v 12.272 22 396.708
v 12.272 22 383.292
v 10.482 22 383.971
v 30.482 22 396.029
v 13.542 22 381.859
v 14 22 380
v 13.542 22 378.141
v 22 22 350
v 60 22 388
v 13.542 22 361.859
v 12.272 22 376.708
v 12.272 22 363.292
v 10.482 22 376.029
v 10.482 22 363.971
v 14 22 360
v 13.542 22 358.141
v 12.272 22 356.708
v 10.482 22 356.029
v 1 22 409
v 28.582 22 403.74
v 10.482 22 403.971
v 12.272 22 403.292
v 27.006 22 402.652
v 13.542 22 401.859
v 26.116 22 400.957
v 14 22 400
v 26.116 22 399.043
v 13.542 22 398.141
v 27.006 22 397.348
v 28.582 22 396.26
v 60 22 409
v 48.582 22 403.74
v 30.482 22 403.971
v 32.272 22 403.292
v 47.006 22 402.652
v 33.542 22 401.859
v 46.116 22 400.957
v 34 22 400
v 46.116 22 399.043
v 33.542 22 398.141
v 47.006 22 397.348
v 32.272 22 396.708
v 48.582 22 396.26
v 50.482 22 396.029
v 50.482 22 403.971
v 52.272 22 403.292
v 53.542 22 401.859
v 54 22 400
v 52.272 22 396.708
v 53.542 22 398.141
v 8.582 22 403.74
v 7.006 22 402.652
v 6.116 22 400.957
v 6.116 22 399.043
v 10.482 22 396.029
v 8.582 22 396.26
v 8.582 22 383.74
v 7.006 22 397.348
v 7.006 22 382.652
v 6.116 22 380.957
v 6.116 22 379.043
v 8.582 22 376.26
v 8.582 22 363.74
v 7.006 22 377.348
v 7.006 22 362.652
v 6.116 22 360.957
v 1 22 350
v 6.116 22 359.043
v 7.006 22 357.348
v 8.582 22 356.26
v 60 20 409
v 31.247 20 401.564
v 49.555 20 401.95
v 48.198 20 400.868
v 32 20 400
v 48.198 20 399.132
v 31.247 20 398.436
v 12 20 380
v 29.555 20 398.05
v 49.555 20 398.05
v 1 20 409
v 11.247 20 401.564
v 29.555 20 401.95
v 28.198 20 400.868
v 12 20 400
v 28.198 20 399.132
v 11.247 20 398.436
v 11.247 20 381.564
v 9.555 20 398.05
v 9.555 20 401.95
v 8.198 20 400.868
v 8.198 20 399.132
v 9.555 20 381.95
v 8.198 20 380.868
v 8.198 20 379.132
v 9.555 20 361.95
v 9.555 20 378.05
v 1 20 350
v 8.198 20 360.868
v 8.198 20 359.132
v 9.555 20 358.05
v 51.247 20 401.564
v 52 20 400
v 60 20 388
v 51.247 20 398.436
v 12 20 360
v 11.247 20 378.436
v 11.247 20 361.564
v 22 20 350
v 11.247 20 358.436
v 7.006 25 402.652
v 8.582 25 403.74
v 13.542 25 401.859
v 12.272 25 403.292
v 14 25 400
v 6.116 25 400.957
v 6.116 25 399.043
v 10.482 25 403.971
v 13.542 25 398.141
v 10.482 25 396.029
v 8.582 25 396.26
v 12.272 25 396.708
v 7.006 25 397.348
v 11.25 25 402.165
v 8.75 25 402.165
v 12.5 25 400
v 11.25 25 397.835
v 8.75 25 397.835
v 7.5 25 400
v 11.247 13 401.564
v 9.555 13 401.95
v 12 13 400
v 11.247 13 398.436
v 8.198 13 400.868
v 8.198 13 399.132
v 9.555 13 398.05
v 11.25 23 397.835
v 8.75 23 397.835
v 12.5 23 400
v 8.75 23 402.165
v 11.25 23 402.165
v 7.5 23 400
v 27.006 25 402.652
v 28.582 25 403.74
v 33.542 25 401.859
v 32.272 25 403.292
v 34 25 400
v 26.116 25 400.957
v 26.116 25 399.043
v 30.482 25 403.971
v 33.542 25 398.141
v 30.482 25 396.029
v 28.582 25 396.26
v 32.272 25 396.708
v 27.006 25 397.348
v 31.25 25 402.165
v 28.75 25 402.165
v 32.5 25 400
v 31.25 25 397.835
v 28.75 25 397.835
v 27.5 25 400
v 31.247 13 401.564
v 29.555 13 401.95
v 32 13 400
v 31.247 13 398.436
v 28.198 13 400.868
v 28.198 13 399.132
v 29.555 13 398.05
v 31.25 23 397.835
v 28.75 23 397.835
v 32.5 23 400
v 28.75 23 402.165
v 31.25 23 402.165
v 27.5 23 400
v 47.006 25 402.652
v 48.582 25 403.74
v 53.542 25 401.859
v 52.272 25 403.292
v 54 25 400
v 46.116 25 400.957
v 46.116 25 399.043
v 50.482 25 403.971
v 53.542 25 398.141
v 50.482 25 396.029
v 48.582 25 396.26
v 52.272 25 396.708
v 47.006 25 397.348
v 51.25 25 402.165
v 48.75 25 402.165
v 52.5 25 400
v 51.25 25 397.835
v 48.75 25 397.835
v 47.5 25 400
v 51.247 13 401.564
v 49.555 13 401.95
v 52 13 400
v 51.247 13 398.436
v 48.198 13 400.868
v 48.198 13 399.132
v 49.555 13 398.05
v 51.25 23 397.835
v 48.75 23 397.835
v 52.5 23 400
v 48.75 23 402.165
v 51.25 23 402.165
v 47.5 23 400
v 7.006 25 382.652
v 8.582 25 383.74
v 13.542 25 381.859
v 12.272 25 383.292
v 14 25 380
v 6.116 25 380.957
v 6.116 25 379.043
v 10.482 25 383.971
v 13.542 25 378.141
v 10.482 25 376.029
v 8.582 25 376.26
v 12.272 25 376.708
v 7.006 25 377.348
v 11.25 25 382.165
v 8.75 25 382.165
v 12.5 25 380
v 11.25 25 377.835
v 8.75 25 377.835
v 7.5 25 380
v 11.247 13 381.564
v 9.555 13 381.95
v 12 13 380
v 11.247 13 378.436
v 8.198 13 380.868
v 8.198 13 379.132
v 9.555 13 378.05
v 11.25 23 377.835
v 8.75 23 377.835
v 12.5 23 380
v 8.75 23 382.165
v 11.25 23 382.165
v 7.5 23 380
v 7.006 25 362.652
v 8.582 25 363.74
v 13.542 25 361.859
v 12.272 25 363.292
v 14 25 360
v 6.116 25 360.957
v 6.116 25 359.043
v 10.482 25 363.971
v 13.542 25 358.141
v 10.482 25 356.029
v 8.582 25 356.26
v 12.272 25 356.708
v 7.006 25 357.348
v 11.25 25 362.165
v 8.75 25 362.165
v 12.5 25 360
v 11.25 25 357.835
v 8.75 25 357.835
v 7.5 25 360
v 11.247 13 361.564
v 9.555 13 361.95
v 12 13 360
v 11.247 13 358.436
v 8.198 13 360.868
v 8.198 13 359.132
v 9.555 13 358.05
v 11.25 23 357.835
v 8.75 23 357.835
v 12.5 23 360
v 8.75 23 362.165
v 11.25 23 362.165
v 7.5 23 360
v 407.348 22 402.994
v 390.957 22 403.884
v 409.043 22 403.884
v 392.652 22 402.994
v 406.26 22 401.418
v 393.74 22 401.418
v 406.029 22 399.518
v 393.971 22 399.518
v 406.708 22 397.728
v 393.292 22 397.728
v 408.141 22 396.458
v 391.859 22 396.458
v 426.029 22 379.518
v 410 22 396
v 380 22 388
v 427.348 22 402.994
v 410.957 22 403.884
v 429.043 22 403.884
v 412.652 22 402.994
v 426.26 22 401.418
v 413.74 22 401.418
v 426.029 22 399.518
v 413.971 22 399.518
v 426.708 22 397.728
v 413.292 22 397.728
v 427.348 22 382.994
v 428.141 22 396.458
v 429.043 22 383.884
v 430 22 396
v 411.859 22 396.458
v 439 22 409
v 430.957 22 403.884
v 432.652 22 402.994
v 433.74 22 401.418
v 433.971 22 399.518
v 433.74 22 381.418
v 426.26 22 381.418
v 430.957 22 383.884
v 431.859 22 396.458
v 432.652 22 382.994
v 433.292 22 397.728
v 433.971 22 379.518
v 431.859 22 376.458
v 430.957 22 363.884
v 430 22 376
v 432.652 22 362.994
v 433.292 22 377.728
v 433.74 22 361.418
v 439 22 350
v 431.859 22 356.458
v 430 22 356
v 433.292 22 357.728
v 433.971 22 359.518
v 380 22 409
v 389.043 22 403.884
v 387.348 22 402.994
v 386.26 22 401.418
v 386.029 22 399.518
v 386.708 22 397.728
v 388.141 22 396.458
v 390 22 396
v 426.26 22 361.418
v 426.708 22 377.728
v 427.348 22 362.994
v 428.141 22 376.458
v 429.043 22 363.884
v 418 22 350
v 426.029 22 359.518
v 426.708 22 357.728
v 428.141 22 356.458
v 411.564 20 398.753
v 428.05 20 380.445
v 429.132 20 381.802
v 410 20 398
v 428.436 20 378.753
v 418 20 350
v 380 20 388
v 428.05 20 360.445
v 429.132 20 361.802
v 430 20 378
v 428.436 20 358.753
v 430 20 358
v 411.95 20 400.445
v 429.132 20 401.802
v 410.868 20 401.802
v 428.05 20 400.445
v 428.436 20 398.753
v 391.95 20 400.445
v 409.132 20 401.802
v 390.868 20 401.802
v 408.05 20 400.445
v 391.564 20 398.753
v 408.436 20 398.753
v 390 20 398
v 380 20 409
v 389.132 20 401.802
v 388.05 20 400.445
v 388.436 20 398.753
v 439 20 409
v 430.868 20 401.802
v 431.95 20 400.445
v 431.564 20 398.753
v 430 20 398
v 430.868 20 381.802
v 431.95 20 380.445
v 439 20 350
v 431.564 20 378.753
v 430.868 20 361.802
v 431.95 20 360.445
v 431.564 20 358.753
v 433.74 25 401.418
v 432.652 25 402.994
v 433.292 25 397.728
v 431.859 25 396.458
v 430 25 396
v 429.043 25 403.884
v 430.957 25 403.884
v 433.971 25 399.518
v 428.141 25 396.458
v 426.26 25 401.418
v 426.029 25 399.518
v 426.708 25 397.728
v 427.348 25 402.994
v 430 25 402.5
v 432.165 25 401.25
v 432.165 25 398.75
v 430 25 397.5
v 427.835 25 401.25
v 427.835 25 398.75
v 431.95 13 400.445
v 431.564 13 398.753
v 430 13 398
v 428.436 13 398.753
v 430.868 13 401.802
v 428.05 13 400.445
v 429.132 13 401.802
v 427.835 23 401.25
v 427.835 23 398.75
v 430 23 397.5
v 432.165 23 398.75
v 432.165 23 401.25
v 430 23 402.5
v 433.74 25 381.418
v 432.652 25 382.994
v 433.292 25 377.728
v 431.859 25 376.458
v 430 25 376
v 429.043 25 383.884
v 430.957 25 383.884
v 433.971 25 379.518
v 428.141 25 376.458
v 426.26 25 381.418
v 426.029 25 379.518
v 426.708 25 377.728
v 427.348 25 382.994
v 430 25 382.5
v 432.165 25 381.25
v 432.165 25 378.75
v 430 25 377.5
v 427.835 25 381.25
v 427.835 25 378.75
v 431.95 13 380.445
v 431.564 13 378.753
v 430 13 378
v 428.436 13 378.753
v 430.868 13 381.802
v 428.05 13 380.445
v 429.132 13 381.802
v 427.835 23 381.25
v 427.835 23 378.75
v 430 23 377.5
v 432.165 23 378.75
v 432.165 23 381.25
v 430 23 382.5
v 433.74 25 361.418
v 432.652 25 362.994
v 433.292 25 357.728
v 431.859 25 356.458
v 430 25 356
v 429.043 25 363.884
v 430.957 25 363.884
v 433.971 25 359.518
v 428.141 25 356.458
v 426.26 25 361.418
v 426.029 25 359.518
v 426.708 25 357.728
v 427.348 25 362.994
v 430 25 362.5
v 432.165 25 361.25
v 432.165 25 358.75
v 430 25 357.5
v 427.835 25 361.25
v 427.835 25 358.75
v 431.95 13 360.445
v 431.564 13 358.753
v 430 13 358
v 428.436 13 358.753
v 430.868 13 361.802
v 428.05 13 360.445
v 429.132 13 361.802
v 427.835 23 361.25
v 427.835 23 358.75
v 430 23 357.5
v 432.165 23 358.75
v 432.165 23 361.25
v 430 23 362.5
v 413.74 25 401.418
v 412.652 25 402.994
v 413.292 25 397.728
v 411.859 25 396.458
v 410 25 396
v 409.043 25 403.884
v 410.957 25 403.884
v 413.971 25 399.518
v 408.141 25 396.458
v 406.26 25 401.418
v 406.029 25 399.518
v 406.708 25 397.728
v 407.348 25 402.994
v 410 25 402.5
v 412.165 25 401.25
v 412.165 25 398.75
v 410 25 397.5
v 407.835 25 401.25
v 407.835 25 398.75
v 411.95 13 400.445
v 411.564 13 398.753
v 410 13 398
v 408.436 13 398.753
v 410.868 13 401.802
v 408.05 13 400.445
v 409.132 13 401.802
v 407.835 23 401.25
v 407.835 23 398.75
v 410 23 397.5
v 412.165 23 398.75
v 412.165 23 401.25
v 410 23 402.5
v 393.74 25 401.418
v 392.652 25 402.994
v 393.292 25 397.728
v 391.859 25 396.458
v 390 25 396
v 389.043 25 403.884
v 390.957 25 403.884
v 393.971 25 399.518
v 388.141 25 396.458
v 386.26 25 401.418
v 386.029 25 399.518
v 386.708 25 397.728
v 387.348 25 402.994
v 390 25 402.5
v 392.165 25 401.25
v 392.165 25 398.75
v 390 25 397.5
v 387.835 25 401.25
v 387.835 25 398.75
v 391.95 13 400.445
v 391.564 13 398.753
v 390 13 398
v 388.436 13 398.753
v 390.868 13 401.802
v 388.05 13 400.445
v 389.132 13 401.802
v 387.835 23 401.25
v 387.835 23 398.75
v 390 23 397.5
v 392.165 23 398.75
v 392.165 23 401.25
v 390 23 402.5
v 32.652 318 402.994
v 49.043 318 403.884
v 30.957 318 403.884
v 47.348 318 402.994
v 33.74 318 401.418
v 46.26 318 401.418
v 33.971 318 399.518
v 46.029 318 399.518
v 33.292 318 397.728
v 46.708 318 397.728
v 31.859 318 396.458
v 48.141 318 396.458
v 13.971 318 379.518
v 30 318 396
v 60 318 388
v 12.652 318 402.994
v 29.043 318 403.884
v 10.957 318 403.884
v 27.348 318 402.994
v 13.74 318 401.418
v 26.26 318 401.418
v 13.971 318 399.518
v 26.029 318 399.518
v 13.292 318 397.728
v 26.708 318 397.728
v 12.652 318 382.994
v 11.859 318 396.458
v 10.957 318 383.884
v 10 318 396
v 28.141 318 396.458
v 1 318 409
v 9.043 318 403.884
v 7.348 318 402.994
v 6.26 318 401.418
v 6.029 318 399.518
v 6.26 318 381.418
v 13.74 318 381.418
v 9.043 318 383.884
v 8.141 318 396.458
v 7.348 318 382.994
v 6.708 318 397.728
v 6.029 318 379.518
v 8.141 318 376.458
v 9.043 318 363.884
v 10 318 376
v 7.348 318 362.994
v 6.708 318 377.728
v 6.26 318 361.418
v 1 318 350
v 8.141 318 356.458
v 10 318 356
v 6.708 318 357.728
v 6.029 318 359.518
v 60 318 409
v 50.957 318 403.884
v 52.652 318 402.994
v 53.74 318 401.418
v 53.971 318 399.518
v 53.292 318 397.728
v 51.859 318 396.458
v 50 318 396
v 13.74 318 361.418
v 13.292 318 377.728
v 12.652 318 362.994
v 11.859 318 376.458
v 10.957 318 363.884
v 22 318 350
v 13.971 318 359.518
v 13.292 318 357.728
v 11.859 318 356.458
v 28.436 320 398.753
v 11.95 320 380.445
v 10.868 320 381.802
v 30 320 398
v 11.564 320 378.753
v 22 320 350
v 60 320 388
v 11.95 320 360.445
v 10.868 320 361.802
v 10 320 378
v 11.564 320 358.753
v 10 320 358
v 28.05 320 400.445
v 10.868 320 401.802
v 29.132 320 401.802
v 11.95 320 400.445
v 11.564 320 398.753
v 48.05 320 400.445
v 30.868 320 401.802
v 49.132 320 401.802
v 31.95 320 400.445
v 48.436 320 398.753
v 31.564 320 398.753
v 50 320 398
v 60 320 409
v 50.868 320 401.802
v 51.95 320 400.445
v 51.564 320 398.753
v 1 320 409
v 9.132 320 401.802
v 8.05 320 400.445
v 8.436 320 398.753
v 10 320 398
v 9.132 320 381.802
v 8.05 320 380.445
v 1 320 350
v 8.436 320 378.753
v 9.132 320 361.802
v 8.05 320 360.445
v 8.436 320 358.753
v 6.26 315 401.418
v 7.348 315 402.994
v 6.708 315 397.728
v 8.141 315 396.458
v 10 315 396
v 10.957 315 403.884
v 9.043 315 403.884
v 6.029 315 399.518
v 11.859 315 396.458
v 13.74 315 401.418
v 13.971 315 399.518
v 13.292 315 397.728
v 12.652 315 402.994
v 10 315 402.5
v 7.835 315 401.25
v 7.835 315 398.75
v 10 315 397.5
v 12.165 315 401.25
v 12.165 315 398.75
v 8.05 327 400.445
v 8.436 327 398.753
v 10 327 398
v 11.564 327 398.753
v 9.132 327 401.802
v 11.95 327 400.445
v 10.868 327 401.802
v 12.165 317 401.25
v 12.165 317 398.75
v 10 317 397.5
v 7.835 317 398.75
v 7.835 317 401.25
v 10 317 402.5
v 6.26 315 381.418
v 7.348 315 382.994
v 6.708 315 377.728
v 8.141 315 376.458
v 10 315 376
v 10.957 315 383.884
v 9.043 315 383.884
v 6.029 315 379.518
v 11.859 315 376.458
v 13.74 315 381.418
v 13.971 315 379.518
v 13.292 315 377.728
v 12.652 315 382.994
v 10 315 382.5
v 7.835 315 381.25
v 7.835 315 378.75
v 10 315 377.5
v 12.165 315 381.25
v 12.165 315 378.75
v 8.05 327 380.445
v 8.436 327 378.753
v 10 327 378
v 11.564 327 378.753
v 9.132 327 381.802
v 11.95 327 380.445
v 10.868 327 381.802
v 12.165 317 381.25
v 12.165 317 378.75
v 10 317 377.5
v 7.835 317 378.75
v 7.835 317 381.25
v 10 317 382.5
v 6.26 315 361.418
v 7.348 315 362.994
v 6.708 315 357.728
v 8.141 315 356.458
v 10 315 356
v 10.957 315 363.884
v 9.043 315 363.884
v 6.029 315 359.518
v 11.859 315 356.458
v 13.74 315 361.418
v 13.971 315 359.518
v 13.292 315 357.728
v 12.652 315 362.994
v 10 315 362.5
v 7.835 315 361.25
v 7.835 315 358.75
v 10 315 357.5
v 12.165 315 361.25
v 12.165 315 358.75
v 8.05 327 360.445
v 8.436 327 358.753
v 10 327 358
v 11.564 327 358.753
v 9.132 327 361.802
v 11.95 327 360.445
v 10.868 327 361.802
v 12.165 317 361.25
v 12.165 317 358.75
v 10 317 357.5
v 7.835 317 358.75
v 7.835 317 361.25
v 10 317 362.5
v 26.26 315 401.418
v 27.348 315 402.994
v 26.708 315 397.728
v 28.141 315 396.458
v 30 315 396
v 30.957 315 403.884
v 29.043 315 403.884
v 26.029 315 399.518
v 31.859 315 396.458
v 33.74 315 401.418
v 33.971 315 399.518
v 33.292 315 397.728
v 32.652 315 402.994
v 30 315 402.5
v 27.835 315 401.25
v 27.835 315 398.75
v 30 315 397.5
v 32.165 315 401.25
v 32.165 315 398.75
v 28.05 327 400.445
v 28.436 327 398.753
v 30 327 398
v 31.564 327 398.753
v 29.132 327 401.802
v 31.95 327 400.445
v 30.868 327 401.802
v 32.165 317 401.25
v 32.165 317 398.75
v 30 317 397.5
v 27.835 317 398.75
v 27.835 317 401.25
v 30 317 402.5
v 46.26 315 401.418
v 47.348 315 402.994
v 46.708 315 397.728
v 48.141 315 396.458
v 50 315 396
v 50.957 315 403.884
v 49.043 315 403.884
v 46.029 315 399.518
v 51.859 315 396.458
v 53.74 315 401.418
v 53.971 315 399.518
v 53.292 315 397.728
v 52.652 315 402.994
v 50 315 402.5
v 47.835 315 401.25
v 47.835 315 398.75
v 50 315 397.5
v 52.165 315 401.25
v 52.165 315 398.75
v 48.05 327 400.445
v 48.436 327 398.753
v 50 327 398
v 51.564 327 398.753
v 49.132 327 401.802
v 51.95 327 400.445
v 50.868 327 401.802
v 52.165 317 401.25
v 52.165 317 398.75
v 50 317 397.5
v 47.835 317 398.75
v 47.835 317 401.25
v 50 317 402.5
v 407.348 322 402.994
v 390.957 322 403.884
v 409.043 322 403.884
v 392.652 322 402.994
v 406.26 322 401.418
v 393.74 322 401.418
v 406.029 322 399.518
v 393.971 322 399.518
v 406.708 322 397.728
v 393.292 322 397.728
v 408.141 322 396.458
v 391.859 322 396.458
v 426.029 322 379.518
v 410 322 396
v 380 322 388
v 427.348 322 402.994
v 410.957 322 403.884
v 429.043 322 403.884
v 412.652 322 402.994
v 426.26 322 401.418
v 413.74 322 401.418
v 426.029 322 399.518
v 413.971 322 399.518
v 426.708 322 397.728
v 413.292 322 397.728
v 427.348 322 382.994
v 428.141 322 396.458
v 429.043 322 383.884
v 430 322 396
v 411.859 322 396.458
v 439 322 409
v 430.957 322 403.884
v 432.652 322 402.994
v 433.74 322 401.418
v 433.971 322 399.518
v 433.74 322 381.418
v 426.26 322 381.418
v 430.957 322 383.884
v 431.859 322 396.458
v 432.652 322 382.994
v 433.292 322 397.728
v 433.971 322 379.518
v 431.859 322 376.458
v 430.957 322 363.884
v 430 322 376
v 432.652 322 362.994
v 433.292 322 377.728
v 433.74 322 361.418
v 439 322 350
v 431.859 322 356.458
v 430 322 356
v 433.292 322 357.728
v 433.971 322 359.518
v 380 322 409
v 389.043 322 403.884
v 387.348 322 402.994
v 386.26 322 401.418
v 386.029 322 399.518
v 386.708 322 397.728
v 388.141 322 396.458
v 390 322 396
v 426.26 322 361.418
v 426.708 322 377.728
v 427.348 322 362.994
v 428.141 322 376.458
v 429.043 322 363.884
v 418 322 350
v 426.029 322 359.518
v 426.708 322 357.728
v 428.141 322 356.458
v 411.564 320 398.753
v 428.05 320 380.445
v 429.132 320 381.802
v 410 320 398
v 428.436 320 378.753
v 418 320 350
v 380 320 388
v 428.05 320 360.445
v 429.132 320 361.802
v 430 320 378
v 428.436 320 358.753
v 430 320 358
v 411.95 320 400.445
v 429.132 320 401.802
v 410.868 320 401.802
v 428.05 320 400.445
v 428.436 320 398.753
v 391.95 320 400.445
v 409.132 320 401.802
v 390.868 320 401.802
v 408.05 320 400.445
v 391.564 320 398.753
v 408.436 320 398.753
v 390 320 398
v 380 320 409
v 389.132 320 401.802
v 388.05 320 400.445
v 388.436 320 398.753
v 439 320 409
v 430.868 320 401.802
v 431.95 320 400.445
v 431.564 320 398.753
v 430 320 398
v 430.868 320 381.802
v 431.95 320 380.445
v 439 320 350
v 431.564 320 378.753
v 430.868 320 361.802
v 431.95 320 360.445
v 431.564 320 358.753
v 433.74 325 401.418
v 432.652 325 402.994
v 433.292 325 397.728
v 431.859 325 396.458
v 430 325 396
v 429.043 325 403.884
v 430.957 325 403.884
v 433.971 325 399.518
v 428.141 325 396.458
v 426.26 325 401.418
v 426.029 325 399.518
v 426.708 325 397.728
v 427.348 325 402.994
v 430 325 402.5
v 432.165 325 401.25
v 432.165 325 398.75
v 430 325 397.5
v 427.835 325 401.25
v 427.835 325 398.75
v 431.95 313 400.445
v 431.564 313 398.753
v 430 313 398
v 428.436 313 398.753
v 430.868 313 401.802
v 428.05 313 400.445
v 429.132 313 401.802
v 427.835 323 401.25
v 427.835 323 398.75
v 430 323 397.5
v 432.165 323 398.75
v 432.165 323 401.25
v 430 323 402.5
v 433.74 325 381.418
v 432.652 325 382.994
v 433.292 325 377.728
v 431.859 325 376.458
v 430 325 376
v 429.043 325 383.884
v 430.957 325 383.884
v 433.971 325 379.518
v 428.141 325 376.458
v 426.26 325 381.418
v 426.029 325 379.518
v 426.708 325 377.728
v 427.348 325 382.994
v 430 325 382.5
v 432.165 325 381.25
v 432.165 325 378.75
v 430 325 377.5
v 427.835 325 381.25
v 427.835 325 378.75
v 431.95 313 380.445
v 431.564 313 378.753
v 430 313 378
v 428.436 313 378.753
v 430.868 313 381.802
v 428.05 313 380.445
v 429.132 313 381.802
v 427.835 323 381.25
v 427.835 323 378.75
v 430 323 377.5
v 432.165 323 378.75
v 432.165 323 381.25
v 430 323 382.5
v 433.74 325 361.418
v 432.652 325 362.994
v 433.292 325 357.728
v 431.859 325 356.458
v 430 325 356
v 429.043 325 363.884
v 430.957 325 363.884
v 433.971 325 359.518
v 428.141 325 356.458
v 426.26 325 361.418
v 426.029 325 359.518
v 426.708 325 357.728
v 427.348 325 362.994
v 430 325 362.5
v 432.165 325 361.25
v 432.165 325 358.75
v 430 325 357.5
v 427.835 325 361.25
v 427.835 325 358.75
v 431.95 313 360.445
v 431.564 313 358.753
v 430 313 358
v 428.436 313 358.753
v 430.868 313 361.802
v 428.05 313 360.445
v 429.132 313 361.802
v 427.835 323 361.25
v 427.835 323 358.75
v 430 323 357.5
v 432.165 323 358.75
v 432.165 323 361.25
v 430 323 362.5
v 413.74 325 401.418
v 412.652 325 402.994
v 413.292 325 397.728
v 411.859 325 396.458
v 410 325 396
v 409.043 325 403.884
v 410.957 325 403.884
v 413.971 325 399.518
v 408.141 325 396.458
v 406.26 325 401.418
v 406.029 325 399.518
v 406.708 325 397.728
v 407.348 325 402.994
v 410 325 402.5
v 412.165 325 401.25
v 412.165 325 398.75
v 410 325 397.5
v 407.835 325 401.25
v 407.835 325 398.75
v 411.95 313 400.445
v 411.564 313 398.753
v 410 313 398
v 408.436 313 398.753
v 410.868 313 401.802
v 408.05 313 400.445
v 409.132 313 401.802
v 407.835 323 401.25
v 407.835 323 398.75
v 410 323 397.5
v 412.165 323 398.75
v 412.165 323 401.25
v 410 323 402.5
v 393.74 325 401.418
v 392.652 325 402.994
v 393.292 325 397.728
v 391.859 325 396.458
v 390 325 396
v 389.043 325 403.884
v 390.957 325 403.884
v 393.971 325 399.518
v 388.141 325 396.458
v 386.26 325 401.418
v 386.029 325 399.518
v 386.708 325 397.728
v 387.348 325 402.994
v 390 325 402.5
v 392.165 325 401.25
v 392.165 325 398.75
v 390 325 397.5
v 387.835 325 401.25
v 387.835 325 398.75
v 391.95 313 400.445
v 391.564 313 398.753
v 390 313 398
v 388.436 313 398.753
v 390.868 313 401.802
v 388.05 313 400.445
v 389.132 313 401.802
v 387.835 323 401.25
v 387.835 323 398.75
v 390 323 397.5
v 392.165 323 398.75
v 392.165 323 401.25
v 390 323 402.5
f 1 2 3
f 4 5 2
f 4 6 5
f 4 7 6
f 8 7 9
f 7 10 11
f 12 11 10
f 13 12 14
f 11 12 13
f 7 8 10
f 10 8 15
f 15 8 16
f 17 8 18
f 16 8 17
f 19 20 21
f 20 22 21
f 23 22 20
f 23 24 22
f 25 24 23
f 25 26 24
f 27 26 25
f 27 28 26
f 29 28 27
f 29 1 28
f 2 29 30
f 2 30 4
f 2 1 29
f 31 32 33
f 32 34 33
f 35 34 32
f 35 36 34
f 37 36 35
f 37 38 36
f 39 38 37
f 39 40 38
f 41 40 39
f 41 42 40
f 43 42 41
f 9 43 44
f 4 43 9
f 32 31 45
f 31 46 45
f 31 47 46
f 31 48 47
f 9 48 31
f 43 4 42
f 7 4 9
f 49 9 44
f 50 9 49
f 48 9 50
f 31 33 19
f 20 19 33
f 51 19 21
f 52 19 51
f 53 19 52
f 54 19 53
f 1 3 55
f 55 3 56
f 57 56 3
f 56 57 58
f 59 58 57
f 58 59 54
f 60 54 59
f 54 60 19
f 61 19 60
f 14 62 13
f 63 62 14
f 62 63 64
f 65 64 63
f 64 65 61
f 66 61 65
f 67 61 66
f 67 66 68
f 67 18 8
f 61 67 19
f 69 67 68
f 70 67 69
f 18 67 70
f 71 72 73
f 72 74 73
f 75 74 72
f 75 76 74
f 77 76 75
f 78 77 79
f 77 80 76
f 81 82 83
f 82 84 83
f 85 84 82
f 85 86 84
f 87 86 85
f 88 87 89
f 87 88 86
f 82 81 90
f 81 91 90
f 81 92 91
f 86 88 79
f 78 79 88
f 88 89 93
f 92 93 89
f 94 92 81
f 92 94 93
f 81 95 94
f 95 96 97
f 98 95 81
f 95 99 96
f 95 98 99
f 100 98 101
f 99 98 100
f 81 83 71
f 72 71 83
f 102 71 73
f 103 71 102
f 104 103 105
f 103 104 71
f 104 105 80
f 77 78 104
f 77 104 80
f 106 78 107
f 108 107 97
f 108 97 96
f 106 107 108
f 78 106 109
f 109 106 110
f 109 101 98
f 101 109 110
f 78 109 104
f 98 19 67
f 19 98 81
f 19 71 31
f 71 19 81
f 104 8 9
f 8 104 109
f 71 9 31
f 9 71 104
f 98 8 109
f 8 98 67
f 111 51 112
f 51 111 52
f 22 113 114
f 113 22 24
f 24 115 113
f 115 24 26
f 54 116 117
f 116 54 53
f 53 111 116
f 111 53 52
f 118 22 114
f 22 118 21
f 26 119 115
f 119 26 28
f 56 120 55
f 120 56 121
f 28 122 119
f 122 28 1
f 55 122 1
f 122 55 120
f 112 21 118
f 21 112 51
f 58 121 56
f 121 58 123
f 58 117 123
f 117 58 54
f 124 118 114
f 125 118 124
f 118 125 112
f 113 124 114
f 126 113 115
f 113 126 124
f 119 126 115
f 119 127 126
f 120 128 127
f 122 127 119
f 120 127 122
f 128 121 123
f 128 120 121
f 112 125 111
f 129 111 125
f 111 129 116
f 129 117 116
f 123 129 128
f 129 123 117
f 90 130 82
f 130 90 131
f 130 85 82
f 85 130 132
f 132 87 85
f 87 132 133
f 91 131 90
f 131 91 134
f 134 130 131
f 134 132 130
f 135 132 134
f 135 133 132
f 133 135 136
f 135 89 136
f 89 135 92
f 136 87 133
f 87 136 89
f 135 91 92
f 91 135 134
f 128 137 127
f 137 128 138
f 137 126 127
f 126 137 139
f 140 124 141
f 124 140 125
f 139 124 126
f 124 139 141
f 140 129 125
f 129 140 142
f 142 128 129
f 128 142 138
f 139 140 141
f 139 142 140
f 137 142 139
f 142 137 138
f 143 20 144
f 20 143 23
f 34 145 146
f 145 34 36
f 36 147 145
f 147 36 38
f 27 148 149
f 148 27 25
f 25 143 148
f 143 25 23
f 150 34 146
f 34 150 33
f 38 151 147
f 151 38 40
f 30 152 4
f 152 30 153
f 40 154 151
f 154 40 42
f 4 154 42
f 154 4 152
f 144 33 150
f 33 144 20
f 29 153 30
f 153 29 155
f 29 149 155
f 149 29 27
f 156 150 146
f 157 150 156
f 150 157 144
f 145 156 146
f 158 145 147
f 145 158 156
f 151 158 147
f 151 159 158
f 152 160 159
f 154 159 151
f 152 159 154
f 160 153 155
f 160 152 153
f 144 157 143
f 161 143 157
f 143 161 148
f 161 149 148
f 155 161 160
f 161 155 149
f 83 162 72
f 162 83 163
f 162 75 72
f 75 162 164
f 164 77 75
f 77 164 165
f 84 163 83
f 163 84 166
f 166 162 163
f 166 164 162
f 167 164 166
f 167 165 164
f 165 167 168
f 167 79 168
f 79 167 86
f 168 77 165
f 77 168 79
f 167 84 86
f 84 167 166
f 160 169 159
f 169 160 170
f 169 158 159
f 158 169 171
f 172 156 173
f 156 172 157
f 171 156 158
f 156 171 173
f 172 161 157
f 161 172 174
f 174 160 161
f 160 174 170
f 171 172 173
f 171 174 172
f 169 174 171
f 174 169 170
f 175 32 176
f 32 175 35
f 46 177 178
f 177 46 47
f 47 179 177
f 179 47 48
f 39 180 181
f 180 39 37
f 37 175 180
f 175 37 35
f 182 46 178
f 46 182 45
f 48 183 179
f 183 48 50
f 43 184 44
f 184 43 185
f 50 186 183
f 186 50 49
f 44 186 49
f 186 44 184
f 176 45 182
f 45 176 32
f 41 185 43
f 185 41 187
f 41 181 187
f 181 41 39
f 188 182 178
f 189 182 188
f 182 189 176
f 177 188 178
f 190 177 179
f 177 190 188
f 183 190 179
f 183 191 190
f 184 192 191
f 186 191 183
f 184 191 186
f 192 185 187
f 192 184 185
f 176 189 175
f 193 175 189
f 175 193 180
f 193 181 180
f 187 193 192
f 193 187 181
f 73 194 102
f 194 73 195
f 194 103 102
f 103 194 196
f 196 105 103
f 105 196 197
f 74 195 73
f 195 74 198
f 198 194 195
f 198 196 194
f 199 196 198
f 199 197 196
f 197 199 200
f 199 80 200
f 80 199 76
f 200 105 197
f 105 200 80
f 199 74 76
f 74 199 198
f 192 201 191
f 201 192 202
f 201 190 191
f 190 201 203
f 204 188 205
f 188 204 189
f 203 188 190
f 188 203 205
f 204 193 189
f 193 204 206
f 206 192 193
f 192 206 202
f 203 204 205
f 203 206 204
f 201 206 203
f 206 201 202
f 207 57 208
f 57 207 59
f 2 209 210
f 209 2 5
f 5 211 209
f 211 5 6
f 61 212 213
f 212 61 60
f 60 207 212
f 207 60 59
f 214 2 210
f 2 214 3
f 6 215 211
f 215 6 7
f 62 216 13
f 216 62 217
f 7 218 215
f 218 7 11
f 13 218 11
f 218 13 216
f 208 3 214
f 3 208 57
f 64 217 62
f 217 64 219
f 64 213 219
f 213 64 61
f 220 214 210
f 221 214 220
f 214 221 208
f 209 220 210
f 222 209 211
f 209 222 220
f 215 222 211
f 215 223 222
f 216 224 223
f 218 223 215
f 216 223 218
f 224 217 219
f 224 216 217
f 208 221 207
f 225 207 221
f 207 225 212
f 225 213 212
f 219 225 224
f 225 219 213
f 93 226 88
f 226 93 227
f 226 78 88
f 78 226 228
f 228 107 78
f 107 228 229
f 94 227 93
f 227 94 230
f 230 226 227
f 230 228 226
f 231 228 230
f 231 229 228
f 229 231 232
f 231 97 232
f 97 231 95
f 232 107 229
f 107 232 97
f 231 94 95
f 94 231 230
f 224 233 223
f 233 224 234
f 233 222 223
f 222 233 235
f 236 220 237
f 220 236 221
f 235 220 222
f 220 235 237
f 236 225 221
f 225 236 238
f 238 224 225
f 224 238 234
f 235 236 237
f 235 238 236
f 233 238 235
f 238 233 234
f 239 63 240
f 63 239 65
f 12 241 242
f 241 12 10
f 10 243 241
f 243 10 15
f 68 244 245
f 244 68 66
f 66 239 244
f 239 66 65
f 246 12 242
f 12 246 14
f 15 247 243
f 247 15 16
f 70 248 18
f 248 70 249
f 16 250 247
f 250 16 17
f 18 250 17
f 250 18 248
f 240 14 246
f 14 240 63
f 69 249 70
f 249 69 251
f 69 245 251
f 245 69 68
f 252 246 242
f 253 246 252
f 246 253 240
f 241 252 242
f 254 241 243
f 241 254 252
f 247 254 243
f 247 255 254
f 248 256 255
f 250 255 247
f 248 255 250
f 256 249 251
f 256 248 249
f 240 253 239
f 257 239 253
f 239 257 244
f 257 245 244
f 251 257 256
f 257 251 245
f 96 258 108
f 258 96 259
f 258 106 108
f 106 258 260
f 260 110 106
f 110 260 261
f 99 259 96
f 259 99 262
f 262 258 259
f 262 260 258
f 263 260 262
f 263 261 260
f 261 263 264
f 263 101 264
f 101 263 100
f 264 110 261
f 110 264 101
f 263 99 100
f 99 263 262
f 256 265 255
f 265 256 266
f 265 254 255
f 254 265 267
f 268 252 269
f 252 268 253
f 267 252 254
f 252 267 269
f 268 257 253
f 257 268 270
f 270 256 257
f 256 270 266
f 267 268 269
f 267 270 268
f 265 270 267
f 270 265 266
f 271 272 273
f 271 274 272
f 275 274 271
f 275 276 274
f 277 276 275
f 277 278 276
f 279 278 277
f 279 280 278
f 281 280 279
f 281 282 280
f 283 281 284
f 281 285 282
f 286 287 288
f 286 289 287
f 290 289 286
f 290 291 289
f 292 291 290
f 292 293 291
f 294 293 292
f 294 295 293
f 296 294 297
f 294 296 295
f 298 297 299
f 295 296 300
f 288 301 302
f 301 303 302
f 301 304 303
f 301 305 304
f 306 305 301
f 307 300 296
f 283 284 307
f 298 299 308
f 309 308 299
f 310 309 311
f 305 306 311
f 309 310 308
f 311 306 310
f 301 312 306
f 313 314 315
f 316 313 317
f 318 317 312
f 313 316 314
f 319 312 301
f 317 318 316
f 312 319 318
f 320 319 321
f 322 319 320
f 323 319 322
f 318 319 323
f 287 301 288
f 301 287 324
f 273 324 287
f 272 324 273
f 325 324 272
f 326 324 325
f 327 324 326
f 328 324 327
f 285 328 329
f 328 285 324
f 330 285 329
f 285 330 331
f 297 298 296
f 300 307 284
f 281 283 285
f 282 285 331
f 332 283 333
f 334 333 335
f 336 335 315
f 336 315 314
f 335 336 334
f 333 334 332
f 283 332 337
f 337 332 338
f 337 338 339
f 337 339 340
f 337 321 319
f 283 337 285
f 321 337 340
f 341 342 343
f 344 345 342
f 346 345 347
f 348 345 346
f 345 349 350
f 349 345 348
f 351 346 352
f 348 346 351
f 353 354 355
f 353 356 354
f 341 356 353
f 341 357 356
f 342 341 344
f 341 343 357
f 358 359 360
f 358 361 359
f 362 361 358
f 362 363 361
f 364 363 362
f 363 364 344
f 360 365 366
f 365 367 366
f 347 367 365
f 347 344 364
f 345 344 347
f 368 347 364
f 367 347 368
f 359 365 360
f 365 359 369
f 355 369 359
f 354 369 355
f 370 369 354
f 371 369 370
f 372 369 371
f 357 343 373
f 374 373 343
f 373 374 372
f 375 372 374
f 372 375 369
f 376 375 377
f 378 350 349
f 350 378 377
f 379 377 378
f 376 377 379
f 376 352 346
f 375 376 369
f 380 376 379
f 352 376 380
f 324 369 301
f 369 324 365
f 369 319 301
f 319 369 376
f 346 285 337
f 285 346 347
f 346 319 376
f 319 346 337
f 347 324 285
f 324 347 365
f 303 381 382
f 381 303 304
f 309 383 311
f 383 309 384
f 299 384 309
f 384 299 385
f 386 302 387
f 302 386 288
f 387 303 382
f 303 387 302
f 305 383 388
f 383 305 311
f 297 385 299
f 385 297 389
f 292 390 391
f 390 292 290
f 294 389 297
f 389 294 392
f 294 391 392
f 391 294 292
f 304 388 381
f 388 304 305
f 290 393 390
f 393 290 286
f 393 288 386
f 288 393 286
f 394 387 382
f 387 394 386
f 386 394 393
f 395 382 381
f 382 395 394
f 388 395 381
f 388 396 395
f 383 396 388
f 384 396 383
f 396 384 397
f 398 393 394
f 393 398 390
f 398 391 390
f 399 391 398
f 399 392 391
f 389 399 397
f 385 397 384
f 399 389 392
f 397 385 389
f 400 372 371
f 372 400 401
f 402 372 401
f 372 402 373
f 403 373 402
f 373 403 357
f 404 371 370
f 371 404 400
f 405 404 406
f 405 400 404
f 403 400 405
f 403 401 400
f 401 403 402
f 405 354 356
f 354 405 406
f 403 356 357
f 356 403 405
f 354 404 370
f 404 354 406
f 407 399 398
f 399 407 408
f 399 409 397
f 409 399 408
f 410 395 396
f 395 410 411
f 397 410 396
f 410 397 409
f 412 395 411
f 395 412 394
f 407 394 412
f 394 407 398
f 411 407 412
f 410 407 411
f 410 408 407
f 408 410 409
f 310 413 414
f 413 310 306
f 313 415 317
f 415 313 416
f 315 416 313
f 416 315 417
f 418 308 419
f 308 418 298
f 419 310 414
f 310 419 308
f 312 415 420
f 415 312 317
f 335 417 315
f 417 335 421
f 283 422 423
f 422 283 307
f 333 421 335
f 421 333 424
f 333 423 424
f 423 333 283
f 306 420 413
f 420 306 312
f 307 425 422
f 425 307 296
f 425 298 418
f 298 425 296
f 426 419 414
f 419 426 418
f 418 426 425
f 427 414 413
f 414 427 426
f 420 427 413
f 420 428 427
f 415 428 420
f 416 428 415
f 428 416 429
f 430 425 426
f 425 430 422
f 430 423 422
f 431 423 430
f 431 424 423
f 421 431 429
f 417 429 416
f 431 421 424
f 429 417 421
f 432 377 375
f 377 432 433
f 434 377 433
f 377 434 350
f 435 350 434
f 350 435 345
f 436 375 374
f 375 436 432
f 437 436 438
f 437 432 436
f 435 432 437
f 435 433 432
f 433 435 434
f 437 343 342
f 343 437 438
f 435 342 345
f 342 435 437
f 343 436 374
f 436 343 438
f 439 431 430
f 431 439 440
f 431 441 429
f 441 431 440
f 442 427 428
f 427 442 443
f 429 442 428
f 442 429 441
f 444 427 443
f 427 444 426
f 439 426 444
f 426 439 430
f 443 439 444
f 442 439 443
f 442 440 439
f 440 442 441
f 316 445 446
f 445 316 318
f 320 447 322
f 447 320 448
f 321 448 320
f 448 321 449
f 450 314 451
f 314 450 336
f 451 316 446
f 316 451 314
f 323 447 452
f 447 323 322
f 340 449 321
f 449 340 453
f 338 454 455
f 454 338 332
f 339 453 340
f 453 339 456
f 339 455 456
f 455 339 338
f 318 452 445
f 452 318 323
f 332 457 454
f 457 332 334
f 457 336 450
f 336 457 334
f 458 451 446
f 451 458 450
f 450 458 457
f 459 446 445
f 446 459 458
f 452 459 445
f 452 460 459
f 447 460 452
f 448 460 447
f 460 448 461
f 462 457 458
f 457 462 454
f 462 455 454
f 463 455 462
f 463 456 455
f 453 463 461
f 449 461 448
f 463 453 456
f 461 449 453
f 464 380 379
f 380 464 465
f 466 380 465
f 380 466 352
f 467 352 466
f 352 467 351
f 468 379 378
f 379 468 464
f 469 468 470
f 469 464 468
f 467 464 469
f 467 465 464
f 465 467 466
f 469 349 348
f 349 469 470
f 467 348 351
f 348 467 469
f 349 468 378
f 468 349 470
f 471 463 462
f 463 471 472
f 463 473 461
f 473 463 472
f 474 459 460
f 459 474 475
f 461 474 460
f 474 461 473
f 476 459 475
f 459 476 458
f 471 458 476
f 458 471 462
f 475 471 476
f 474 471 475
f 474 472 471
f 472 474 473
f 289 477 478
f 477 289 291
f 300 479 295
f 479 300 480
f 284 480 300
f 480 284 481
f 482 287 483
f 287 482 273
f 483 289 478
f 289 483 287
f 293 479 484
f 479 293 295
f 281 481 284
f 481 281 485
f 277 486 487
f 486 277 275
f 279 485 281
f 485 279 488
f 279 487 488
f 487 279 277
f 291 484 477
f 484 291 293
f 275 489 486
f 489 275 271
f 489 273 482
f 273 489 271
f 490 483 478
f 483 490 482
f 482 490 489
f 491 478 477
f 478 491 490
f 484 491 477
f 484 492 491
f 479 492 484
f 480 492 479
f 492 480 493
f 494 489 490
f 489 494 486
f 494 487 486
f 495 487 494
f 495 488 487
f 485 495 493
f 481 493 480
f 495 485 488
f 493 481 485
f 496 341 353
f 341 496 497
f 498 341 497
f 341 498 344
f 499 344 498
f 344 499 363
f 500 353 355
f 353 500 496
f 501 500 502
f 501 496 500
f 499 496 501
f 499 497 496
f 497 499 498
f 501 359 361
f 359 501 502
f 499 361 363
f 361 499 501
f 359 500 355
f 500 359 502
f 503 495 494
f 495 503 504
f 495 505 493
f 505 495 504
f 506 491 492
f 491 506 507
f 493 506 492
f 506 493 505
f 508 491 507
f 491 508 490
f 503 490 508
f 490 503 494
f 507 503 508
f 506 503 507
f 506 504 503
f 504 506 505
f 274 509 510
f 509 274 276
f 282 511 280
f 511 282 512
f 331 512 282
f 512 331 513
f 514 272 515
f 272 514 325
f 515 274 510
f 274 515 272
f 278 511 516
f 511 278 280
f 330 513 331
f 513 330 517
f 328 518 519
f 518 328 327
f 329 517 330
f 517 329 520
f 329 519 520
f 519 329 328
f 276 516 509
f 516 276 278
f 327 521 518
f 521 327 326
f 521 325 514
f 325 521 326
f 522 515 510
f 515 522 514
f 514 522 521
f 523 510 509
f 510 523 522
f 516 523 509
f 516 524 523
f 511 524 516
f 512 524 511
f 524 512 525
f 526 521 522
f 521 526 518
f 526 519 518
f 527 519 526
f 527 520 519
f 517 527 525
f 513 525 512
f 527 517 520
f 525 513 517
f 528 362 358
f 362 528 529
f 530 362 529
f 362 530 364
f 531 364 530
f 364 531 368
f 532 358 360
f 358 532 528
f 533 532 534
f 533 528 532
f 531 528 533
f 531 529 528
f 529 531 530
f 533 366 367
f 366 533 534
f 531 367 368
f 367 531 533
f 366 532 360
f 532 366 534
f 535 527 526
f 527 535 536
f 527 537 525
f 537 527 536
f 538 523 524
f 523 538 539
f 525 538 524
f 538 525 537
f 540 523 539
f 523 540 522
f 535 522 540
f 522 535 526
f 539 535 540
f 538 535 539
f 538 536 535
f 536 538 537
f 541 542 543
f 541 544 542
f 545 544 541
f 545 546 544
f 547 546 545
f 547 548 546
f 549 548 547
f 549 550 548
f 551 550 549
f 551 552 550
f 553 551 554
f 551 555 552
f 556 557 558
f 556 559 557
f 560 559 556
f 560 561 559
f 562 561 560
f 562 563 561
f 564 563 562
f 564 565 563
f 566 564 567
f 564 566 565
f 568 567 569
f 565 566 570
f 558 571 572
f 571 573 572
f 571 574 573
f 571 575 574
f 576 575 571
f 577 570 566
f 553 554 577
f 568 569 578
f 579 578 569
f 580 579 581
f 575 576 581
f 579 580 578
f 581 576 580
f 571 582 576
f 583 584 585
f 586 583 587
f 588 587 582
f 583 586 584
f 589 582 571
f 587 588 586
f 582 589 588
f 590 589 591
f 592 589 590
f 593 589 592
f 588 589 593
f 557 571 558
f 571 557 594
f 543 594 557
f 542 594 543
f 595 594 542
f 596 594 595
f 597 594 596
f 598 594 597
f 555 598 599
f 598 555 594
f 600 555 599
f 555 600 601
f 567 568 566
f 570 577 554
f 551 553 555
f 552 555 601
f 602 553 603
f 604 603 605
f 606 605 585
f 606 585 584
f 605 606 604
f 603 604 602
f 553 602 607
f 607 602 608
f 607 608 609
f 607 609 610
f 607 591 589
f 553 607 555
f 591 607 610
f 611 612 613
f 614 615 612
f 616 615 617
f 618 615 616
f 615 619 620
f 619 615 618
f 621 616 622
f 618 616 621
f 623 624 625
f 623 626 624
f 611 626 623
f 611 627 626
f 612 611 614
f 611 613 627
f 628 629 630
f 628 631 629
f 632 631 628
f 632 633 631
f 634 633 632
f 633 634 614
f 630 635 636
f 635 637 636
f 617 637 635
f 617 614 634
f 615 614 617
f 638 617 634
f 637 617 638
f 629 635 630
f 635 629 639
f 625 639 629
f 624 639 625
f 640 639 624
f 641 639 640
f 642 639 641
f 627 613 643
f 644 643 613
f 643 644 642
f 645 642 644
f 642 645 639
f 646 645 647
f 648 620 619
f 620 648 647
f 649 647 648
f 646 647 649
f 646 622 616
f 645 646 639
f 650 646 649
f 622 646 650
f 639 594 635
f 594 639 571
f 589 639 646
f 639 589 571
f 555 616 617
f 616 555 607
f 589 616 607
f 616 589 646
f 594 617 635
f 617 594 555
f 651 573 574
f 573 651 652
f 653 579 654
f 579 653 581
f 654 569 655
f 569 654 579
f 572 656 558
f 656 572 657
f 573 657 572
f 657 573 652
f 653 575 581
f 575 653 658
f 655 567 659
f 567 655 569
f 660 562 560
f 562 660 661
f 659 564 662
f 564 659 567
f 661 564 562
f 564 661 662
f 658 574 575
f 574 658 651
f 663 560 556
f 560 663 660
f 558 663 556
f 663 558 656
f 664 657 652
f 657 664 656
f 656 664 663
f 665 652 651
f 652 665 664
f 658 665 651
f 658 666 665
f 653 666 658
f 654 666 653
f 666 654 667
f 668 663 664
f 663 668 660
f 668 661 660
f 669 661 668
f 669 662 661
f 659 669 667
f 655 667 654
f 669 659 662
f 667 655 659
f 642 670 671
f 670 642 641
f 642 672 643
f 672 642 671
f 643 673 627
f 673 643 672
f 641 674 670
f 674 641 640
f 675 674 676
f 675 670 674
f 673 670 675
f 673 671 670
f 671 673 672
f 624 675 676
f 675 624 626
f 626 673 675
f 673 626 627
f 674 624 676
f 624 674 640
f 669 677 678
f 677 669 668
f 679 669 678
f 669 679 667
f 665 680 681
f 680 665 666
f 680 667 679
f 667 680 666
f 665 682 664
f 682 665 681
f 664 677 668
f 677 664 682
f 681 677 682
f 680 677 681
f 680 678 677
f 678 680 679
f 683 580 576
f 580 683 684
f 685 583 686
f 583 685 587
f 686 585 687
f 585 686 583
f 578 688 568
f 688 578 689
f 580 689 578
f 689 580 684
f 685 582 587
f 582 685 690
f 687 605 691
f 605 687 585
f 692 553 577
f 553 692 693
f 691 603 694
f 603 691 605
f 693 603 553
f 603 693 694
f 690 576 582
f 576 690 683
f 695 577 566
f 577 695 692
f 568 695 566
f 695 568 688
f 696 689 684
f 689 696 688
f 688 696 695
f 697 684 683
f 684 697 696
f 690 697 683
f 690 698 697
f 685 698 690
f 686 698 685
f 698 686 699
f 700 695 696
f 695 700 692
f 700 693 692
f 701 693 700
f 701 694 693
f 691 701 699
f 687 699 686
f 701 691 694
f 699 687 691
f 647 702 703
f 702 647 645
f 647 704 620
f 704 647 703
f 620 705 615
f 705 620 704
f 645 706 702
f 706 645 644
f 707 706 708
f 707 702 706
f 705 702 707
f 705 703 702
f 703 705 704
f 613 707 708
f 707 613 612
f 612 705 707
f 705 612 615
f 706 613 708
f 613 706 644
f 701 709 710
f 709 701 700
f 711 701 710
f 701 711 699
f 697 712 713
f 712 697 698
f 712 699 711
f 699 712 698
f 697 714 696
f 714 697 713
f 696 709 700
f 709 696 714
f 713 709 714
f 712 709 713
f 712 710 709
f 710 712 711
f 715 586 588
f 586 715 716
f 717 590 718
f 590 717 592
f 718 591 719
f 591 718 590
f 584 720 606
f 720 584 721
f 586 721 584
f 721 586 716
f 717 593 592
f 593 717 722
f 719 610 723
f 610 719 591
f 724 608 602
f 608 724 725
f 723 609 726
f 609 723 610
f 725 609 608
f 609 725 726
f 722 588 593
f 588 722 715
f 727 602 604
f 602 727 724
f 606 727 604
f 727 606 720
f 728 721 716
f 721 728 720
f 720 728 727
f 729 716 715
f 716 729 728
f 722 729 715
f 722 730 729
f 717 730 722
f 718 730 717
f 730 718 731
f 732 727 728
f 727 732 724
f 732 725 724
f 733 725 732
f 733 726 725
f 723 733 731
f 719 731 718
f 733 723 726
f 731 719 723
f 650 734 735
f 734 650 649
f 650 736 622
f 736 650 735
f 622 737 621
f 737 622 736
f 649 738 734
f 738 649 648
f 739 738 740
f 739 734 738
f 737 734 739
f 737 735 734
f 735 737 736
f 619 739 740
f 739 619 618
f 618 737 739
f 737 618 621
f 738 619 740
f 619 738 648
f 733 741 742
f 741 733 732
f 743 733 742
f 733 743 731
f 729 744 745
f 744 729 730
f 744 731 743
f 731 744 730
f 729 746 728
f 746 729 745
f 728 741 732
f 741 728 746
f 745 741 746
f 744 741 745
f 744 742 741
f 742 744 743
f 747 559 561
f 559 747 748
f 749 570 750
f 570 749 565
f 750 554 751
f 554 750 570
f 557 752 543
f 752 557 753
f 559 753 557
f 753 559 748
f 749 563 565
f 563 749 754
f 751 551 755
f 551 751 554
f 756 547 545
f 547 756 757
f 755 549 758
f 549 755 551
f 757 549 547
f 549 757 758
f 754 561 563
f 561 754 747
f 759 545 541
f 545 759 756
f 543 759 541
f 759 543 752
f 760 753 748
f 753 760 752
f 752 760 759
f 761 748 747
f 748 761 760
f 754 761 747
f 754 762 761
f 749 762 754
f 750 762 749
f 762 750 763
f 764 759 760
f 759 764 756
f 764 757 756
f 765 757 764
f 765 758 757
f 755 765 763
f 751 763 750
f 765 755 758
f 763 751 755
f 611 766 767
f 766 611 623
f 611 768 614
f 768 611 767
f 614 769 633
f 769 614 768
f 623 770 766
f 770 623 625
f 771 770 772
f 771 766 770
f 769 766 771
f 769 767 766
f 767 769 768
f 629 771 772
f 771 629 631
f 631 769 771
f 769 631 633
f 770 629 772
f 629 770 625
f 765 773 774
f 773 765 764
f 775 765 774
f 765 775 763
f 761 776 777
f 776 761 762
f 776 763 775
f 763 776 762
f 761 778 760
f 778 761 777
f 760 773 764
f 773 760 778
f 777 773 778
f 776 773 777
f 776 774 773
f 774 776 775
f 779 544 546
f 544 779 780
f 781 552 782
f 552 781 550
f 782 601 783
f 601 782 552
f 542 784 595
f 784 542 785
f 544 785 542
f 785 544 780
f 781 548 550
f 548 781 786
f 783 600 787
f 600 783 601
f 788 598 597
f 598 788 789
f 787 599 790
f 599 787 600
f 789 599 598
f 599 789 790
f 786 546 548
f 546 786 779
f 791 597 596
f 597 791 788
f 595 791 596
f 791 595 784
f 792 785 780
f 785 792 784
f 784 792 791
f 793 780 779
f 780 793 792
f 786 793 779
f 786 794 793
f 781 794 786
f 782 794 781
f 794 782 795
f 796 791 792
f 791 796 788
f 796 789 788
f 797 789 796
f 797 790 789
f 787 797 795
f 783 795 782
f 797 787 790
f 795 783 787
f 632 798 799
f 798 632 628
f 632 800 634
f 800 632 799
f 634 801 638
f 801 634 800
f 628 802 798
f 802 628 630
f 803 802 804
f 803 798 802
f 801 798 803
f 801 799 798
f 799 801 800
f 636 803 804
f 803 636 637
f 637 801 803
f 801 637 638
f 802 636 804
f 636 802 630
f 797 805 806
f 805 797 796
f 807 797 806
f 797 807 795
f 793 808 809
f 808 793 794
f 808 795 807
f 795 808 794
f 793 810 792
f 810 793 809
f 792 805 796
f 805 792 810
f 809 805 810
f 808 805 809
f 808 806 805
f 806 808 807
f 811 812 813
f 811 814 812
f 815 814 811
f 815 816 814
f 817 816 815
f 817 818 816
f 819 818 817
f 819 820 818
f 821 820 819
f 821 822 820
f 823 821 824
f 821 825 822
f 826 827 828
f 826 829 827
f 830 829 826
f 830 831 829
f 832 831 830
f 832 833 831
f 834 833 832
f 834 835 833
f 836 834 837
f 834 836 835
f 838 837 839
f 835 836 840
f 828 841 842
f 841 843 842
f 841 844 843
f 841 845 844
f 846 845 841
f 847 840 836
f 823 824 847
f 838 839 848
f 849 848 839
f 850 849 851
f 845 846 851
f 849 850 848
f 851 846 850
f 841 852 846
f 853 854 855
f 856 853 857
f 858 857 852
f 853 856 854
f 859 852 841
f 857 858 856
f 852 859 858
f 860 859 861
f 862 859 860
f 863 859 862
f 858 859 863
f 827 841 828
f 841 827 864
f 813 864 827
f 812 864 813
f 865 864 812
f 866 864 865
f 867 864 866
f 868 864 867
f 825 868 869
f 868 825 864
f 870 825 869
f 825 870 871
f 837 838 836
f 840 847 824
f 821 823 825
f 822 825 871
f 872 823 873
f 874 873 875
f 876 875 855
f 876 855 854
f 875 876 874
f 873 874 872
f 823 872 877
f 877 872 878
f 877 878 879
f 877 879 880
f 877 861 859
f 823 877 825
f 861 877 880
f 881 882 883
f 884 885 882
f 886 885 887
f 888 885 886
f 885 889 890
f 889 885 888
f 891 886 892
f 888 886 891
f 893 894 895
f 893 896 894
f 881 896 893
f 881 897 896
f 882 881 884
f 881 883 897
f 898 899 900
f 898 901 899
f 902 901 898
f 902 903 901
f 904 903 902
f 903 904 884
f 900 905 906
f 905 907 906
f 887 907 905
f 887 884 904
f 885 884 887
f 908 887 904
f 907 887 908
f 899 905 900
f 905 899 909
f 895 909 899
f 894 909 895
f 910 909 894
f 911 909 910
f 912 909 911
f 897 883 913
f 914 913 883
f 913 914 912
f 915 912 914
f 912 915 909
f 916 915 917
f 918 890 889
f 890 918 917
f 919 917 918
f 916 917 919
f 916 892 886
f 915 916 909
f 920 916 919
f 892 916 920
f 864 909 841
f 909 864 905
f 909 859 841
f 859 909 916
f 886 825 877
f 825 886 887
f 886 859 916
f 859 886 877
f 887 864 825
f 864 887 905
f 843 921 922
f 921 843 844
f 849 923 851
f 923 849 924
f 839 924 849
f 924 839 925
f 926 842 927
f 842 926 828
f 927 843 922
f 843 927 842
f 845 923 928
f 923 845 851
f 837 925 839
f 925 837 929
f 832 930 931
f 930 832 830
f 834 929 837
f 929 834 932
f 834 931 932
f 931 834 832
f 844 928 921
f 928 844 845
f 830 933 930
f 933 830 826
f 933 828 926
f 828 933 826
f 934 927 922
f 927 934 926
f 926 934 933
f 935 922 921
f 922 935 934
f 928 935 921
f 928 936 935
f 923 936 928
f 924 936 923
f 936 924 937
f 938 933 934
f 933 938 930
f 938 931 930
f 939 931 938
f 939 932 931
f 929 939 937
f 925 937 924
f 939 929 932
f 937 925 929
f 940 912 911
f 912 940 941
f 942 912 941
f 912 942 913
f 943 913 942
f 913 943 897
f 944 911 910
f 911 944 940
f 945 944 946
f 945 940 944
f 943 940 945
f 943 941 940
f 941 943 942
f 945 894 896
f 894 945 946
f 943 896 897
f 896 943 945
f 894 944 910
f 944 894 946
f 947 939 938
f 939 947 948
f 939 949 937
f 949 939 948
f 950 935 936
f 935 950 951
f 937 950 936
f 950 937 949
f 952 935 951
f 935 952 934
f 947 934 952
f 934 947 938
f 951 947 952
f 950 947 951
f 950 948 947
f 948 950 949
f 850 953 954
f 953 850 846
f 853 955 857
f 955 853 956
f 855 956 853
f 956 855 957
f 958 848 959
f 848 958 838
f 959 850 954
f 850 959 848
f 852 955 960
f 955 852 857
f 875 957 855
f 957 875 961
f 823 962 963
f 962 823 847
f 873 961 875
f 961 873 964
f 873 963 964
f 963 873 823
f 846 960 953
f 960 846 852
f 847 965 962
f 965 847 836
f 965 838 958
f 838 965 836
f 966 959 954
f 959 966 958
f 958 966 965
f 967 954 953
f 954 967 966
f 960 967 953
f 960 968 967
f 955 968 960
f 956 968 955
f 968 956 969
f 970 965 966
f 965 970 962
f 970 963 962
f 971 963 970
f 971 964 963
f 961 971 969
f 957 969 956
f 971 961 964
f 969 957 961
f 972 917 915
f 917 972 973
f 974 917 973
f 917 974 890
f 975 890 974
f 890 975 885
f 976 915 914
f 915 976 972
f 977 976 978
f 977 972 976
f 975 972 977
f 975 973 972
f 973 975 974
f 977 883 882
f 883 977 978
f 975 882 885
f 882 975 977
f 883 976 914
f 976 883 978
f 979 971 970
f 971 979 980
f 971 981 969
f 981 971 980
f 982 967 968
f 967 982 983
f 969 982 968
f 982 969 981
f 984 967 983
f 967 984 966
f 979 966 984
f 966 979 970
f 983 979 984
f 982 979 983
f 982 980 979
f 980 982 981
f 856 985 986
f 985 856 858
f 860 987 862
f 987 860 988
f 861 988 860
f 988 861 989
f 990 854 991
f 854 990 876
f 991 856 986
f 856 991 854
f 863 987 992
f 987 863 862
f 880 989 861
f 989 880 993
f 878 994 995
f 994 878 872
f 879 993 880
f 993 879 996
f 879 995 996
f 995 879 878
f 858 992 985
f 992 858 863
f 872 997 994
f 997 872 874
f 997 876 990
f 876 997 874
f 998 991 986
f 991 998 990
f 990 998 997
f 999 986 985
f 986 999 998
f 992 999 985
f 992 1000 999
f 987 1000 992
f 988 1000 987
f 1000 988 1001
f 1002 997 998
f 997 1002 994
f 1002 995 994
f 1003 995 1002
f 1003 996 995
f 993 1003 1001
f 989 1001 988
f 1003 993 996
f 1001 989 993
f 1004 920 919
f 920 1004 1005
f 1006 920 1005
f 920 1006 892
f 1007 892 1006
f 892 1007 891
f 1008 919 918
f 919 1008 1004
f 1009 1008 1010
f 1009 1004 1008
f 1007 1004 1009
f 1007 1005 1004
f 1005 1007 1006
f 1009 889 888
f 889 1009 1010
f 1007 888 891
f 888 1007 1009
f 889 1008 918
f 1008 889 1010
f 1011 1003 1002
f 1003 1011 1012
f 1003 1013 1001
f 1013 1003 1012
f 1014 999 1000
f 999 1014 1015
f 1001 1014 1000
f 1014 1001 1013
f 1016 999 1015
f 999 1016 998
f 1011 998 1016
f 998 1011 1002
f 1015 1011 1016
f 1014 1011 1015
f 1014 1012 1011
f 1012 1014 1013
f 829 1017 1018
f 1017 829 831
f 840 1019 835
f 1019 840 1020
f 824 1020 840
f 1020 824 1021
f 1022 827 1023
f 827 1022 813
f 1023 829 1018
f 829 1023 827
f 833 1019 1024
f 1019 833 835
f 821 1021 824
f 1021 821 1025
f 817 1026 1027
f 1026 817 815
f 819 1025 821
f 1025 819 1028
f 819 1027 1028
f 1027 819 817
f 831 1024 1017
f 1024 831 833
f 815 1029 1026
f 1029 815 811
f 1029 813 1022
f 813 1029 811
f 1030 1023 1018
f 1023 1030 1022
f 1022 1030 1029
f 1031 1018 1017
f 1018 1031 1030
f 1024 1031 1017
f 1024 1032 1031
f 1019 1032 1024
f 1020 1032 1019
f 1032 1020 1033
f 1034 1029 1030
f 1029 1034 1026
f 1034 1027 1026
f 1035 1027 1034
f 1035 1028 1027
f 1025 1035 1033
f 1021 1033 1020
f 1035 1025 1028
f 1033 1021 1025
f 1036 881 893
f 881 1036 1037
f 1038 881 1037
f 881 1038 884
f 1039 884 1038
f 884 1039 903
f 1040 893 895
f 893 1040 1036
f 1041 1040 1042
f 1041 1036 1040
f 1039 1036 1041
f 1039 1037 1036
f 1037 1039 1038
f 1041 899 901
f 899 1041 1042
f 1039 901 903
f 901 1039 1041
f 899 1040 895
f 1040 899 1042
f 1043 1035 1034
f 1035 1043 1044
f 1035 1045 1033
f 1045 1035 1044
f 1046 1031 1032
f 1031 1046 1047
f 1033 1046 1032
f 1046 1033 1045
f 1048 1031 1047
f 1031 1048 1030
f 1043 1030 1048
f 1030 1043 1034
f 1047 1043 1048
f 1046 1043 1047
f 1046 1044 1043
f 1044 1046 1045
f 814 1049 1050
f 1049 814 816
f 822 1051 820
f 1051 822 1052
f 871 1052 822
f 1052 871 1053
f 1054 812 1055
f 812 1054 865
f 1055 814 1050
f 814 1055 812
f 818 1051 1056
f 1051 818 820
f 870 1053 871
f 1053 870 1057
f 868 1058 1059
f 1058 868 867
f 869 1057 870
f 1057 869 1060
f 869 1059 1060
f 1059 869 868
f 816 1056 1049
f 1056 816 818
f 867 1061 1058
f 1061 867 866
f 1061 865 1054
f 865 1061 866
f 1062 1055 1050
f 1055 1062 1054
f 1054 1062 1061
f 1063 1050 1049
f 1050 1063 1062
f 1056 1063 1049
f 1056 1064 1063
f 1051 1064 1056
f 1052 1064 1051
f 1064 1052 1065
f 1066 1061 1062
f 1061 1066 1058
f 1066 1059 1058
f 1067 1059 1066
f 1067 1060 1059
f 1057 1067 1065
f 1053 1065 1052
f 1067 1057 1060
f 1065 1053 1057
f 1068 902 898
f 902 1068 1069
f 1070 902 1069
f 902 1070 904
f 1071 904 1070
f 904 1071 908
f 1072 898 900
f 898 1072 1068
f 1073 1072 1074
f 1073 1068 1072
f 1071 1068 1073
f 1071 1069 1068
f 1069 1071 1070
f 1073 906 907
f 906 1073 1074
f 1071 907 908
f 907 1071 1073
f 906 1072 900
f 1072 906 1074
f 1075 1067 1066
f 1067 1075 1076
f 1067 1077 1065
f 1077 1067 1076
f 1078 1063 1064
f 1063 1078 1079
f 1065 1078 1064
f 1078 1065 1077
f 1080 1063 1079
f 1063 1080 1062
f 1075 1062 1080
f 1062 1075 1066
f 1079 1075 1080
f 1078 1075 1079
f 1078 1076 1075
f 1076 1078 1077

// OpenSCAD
/*
Mount plate for CoreXY top profile
*/
module MountPlate (){
difference (){
    color( "DarkGray", 1 ) {
     translate ([1,1,0]) {
     cube ([80,80,2]) ; 
     }  
    }
    translate ([81,1,-1]) {
    rotate ([0,0,45]) {
    cube ([160,160,4]) ; 
    }}
    translate ([60,0,-1]) {
    cube ([60,60,4]) ; 
    }
    translate ([0,60,-1]) {
    cube ([60,60,4]) ; 
    }
    }
    
    


       translate ([10,10,5]){
           rotate ([180,0,0]){
   difference (){ 
     
     union (){
     color( "Silver", 1 ) {
     cylinder(h = 3, d = 8,  center = false); 
     cylinder(h = 12, d = 4,  center = false);          
    }}
    translate ([0,0,-2]){
    cylinder(h = 4, d = 5, $fn=6, center = false);
    
    }
    }
    
    }}
       translate ([30,10,5]){
           rotate ([180,0,0]){
   difference (){ 
     
     union (){
     color( "Silver", 1 ) {
     cylinder(h = 3, d = 8,  center = false); 
     cylinder(h = 12, d = 4,  center = false);          
    }}
    translate ([0,0,-2]){
    cylinder(h = 4, d = 5, $fn=6, center = false);
    
    }
    }
    
    }}
           translate ([50,10,5]){
           rotate ([180,0,0]){
   difference (){ 
     
     union (){
     color( "Silver", 1 ) {
     cylinder(h = 3, d = 8,  center = false); 
     cylinder(h = 12, d = 4,  center = false);          
    }}
    translate ([0,0,-2]){
    cylinder(h = 4, d = 5, $fn=6, center = false);
    
    }
    }
    
    }}
               translate ([10,30,5]){
           rotate ([180,0,0]){
   difference (){ 
     
     union (){
     color( "Silver", 1 ) {
     cylinder(h = 3, d = 8,  center = false); 
     cylinder(h = 12, d = 4,  center = false);          
    }}
    translate ([0,0,-2]){
    cylinder(h = 4, d = 5, $fn=6, center = false);
    
    }
    }
    
    }}
               translate ([10,50,5]){
           rotate ([180,0,0]){
   difference (){ 
     
     union (){
     color( "Silver", 1 ) {
     cylinder(h = 3, d = 8,  center = false); 
     cylinder(h = 12, d = 4,  center = false);          
    }}
    translate ([0,0,-2]){
    cylinder(h = 4, d = 5, $fn=6, center = false);
    
    }
    }
    
    }}
}



translate ([0,20,410]) {
    rotate ([270,0,0]) {
MountPlate ();
    }}
translate ([440,20,410]) {
    rotate ([270,90,0]) {
MountPlate ();
    }}    
    
translate ([0,320,410]) {
    rotate ([90,90,0]) {
MountPlate ();
    }}
    translate ([440,320,410]) {
    rotate ([270,90,0]) {
MountPlate ();
    }}
